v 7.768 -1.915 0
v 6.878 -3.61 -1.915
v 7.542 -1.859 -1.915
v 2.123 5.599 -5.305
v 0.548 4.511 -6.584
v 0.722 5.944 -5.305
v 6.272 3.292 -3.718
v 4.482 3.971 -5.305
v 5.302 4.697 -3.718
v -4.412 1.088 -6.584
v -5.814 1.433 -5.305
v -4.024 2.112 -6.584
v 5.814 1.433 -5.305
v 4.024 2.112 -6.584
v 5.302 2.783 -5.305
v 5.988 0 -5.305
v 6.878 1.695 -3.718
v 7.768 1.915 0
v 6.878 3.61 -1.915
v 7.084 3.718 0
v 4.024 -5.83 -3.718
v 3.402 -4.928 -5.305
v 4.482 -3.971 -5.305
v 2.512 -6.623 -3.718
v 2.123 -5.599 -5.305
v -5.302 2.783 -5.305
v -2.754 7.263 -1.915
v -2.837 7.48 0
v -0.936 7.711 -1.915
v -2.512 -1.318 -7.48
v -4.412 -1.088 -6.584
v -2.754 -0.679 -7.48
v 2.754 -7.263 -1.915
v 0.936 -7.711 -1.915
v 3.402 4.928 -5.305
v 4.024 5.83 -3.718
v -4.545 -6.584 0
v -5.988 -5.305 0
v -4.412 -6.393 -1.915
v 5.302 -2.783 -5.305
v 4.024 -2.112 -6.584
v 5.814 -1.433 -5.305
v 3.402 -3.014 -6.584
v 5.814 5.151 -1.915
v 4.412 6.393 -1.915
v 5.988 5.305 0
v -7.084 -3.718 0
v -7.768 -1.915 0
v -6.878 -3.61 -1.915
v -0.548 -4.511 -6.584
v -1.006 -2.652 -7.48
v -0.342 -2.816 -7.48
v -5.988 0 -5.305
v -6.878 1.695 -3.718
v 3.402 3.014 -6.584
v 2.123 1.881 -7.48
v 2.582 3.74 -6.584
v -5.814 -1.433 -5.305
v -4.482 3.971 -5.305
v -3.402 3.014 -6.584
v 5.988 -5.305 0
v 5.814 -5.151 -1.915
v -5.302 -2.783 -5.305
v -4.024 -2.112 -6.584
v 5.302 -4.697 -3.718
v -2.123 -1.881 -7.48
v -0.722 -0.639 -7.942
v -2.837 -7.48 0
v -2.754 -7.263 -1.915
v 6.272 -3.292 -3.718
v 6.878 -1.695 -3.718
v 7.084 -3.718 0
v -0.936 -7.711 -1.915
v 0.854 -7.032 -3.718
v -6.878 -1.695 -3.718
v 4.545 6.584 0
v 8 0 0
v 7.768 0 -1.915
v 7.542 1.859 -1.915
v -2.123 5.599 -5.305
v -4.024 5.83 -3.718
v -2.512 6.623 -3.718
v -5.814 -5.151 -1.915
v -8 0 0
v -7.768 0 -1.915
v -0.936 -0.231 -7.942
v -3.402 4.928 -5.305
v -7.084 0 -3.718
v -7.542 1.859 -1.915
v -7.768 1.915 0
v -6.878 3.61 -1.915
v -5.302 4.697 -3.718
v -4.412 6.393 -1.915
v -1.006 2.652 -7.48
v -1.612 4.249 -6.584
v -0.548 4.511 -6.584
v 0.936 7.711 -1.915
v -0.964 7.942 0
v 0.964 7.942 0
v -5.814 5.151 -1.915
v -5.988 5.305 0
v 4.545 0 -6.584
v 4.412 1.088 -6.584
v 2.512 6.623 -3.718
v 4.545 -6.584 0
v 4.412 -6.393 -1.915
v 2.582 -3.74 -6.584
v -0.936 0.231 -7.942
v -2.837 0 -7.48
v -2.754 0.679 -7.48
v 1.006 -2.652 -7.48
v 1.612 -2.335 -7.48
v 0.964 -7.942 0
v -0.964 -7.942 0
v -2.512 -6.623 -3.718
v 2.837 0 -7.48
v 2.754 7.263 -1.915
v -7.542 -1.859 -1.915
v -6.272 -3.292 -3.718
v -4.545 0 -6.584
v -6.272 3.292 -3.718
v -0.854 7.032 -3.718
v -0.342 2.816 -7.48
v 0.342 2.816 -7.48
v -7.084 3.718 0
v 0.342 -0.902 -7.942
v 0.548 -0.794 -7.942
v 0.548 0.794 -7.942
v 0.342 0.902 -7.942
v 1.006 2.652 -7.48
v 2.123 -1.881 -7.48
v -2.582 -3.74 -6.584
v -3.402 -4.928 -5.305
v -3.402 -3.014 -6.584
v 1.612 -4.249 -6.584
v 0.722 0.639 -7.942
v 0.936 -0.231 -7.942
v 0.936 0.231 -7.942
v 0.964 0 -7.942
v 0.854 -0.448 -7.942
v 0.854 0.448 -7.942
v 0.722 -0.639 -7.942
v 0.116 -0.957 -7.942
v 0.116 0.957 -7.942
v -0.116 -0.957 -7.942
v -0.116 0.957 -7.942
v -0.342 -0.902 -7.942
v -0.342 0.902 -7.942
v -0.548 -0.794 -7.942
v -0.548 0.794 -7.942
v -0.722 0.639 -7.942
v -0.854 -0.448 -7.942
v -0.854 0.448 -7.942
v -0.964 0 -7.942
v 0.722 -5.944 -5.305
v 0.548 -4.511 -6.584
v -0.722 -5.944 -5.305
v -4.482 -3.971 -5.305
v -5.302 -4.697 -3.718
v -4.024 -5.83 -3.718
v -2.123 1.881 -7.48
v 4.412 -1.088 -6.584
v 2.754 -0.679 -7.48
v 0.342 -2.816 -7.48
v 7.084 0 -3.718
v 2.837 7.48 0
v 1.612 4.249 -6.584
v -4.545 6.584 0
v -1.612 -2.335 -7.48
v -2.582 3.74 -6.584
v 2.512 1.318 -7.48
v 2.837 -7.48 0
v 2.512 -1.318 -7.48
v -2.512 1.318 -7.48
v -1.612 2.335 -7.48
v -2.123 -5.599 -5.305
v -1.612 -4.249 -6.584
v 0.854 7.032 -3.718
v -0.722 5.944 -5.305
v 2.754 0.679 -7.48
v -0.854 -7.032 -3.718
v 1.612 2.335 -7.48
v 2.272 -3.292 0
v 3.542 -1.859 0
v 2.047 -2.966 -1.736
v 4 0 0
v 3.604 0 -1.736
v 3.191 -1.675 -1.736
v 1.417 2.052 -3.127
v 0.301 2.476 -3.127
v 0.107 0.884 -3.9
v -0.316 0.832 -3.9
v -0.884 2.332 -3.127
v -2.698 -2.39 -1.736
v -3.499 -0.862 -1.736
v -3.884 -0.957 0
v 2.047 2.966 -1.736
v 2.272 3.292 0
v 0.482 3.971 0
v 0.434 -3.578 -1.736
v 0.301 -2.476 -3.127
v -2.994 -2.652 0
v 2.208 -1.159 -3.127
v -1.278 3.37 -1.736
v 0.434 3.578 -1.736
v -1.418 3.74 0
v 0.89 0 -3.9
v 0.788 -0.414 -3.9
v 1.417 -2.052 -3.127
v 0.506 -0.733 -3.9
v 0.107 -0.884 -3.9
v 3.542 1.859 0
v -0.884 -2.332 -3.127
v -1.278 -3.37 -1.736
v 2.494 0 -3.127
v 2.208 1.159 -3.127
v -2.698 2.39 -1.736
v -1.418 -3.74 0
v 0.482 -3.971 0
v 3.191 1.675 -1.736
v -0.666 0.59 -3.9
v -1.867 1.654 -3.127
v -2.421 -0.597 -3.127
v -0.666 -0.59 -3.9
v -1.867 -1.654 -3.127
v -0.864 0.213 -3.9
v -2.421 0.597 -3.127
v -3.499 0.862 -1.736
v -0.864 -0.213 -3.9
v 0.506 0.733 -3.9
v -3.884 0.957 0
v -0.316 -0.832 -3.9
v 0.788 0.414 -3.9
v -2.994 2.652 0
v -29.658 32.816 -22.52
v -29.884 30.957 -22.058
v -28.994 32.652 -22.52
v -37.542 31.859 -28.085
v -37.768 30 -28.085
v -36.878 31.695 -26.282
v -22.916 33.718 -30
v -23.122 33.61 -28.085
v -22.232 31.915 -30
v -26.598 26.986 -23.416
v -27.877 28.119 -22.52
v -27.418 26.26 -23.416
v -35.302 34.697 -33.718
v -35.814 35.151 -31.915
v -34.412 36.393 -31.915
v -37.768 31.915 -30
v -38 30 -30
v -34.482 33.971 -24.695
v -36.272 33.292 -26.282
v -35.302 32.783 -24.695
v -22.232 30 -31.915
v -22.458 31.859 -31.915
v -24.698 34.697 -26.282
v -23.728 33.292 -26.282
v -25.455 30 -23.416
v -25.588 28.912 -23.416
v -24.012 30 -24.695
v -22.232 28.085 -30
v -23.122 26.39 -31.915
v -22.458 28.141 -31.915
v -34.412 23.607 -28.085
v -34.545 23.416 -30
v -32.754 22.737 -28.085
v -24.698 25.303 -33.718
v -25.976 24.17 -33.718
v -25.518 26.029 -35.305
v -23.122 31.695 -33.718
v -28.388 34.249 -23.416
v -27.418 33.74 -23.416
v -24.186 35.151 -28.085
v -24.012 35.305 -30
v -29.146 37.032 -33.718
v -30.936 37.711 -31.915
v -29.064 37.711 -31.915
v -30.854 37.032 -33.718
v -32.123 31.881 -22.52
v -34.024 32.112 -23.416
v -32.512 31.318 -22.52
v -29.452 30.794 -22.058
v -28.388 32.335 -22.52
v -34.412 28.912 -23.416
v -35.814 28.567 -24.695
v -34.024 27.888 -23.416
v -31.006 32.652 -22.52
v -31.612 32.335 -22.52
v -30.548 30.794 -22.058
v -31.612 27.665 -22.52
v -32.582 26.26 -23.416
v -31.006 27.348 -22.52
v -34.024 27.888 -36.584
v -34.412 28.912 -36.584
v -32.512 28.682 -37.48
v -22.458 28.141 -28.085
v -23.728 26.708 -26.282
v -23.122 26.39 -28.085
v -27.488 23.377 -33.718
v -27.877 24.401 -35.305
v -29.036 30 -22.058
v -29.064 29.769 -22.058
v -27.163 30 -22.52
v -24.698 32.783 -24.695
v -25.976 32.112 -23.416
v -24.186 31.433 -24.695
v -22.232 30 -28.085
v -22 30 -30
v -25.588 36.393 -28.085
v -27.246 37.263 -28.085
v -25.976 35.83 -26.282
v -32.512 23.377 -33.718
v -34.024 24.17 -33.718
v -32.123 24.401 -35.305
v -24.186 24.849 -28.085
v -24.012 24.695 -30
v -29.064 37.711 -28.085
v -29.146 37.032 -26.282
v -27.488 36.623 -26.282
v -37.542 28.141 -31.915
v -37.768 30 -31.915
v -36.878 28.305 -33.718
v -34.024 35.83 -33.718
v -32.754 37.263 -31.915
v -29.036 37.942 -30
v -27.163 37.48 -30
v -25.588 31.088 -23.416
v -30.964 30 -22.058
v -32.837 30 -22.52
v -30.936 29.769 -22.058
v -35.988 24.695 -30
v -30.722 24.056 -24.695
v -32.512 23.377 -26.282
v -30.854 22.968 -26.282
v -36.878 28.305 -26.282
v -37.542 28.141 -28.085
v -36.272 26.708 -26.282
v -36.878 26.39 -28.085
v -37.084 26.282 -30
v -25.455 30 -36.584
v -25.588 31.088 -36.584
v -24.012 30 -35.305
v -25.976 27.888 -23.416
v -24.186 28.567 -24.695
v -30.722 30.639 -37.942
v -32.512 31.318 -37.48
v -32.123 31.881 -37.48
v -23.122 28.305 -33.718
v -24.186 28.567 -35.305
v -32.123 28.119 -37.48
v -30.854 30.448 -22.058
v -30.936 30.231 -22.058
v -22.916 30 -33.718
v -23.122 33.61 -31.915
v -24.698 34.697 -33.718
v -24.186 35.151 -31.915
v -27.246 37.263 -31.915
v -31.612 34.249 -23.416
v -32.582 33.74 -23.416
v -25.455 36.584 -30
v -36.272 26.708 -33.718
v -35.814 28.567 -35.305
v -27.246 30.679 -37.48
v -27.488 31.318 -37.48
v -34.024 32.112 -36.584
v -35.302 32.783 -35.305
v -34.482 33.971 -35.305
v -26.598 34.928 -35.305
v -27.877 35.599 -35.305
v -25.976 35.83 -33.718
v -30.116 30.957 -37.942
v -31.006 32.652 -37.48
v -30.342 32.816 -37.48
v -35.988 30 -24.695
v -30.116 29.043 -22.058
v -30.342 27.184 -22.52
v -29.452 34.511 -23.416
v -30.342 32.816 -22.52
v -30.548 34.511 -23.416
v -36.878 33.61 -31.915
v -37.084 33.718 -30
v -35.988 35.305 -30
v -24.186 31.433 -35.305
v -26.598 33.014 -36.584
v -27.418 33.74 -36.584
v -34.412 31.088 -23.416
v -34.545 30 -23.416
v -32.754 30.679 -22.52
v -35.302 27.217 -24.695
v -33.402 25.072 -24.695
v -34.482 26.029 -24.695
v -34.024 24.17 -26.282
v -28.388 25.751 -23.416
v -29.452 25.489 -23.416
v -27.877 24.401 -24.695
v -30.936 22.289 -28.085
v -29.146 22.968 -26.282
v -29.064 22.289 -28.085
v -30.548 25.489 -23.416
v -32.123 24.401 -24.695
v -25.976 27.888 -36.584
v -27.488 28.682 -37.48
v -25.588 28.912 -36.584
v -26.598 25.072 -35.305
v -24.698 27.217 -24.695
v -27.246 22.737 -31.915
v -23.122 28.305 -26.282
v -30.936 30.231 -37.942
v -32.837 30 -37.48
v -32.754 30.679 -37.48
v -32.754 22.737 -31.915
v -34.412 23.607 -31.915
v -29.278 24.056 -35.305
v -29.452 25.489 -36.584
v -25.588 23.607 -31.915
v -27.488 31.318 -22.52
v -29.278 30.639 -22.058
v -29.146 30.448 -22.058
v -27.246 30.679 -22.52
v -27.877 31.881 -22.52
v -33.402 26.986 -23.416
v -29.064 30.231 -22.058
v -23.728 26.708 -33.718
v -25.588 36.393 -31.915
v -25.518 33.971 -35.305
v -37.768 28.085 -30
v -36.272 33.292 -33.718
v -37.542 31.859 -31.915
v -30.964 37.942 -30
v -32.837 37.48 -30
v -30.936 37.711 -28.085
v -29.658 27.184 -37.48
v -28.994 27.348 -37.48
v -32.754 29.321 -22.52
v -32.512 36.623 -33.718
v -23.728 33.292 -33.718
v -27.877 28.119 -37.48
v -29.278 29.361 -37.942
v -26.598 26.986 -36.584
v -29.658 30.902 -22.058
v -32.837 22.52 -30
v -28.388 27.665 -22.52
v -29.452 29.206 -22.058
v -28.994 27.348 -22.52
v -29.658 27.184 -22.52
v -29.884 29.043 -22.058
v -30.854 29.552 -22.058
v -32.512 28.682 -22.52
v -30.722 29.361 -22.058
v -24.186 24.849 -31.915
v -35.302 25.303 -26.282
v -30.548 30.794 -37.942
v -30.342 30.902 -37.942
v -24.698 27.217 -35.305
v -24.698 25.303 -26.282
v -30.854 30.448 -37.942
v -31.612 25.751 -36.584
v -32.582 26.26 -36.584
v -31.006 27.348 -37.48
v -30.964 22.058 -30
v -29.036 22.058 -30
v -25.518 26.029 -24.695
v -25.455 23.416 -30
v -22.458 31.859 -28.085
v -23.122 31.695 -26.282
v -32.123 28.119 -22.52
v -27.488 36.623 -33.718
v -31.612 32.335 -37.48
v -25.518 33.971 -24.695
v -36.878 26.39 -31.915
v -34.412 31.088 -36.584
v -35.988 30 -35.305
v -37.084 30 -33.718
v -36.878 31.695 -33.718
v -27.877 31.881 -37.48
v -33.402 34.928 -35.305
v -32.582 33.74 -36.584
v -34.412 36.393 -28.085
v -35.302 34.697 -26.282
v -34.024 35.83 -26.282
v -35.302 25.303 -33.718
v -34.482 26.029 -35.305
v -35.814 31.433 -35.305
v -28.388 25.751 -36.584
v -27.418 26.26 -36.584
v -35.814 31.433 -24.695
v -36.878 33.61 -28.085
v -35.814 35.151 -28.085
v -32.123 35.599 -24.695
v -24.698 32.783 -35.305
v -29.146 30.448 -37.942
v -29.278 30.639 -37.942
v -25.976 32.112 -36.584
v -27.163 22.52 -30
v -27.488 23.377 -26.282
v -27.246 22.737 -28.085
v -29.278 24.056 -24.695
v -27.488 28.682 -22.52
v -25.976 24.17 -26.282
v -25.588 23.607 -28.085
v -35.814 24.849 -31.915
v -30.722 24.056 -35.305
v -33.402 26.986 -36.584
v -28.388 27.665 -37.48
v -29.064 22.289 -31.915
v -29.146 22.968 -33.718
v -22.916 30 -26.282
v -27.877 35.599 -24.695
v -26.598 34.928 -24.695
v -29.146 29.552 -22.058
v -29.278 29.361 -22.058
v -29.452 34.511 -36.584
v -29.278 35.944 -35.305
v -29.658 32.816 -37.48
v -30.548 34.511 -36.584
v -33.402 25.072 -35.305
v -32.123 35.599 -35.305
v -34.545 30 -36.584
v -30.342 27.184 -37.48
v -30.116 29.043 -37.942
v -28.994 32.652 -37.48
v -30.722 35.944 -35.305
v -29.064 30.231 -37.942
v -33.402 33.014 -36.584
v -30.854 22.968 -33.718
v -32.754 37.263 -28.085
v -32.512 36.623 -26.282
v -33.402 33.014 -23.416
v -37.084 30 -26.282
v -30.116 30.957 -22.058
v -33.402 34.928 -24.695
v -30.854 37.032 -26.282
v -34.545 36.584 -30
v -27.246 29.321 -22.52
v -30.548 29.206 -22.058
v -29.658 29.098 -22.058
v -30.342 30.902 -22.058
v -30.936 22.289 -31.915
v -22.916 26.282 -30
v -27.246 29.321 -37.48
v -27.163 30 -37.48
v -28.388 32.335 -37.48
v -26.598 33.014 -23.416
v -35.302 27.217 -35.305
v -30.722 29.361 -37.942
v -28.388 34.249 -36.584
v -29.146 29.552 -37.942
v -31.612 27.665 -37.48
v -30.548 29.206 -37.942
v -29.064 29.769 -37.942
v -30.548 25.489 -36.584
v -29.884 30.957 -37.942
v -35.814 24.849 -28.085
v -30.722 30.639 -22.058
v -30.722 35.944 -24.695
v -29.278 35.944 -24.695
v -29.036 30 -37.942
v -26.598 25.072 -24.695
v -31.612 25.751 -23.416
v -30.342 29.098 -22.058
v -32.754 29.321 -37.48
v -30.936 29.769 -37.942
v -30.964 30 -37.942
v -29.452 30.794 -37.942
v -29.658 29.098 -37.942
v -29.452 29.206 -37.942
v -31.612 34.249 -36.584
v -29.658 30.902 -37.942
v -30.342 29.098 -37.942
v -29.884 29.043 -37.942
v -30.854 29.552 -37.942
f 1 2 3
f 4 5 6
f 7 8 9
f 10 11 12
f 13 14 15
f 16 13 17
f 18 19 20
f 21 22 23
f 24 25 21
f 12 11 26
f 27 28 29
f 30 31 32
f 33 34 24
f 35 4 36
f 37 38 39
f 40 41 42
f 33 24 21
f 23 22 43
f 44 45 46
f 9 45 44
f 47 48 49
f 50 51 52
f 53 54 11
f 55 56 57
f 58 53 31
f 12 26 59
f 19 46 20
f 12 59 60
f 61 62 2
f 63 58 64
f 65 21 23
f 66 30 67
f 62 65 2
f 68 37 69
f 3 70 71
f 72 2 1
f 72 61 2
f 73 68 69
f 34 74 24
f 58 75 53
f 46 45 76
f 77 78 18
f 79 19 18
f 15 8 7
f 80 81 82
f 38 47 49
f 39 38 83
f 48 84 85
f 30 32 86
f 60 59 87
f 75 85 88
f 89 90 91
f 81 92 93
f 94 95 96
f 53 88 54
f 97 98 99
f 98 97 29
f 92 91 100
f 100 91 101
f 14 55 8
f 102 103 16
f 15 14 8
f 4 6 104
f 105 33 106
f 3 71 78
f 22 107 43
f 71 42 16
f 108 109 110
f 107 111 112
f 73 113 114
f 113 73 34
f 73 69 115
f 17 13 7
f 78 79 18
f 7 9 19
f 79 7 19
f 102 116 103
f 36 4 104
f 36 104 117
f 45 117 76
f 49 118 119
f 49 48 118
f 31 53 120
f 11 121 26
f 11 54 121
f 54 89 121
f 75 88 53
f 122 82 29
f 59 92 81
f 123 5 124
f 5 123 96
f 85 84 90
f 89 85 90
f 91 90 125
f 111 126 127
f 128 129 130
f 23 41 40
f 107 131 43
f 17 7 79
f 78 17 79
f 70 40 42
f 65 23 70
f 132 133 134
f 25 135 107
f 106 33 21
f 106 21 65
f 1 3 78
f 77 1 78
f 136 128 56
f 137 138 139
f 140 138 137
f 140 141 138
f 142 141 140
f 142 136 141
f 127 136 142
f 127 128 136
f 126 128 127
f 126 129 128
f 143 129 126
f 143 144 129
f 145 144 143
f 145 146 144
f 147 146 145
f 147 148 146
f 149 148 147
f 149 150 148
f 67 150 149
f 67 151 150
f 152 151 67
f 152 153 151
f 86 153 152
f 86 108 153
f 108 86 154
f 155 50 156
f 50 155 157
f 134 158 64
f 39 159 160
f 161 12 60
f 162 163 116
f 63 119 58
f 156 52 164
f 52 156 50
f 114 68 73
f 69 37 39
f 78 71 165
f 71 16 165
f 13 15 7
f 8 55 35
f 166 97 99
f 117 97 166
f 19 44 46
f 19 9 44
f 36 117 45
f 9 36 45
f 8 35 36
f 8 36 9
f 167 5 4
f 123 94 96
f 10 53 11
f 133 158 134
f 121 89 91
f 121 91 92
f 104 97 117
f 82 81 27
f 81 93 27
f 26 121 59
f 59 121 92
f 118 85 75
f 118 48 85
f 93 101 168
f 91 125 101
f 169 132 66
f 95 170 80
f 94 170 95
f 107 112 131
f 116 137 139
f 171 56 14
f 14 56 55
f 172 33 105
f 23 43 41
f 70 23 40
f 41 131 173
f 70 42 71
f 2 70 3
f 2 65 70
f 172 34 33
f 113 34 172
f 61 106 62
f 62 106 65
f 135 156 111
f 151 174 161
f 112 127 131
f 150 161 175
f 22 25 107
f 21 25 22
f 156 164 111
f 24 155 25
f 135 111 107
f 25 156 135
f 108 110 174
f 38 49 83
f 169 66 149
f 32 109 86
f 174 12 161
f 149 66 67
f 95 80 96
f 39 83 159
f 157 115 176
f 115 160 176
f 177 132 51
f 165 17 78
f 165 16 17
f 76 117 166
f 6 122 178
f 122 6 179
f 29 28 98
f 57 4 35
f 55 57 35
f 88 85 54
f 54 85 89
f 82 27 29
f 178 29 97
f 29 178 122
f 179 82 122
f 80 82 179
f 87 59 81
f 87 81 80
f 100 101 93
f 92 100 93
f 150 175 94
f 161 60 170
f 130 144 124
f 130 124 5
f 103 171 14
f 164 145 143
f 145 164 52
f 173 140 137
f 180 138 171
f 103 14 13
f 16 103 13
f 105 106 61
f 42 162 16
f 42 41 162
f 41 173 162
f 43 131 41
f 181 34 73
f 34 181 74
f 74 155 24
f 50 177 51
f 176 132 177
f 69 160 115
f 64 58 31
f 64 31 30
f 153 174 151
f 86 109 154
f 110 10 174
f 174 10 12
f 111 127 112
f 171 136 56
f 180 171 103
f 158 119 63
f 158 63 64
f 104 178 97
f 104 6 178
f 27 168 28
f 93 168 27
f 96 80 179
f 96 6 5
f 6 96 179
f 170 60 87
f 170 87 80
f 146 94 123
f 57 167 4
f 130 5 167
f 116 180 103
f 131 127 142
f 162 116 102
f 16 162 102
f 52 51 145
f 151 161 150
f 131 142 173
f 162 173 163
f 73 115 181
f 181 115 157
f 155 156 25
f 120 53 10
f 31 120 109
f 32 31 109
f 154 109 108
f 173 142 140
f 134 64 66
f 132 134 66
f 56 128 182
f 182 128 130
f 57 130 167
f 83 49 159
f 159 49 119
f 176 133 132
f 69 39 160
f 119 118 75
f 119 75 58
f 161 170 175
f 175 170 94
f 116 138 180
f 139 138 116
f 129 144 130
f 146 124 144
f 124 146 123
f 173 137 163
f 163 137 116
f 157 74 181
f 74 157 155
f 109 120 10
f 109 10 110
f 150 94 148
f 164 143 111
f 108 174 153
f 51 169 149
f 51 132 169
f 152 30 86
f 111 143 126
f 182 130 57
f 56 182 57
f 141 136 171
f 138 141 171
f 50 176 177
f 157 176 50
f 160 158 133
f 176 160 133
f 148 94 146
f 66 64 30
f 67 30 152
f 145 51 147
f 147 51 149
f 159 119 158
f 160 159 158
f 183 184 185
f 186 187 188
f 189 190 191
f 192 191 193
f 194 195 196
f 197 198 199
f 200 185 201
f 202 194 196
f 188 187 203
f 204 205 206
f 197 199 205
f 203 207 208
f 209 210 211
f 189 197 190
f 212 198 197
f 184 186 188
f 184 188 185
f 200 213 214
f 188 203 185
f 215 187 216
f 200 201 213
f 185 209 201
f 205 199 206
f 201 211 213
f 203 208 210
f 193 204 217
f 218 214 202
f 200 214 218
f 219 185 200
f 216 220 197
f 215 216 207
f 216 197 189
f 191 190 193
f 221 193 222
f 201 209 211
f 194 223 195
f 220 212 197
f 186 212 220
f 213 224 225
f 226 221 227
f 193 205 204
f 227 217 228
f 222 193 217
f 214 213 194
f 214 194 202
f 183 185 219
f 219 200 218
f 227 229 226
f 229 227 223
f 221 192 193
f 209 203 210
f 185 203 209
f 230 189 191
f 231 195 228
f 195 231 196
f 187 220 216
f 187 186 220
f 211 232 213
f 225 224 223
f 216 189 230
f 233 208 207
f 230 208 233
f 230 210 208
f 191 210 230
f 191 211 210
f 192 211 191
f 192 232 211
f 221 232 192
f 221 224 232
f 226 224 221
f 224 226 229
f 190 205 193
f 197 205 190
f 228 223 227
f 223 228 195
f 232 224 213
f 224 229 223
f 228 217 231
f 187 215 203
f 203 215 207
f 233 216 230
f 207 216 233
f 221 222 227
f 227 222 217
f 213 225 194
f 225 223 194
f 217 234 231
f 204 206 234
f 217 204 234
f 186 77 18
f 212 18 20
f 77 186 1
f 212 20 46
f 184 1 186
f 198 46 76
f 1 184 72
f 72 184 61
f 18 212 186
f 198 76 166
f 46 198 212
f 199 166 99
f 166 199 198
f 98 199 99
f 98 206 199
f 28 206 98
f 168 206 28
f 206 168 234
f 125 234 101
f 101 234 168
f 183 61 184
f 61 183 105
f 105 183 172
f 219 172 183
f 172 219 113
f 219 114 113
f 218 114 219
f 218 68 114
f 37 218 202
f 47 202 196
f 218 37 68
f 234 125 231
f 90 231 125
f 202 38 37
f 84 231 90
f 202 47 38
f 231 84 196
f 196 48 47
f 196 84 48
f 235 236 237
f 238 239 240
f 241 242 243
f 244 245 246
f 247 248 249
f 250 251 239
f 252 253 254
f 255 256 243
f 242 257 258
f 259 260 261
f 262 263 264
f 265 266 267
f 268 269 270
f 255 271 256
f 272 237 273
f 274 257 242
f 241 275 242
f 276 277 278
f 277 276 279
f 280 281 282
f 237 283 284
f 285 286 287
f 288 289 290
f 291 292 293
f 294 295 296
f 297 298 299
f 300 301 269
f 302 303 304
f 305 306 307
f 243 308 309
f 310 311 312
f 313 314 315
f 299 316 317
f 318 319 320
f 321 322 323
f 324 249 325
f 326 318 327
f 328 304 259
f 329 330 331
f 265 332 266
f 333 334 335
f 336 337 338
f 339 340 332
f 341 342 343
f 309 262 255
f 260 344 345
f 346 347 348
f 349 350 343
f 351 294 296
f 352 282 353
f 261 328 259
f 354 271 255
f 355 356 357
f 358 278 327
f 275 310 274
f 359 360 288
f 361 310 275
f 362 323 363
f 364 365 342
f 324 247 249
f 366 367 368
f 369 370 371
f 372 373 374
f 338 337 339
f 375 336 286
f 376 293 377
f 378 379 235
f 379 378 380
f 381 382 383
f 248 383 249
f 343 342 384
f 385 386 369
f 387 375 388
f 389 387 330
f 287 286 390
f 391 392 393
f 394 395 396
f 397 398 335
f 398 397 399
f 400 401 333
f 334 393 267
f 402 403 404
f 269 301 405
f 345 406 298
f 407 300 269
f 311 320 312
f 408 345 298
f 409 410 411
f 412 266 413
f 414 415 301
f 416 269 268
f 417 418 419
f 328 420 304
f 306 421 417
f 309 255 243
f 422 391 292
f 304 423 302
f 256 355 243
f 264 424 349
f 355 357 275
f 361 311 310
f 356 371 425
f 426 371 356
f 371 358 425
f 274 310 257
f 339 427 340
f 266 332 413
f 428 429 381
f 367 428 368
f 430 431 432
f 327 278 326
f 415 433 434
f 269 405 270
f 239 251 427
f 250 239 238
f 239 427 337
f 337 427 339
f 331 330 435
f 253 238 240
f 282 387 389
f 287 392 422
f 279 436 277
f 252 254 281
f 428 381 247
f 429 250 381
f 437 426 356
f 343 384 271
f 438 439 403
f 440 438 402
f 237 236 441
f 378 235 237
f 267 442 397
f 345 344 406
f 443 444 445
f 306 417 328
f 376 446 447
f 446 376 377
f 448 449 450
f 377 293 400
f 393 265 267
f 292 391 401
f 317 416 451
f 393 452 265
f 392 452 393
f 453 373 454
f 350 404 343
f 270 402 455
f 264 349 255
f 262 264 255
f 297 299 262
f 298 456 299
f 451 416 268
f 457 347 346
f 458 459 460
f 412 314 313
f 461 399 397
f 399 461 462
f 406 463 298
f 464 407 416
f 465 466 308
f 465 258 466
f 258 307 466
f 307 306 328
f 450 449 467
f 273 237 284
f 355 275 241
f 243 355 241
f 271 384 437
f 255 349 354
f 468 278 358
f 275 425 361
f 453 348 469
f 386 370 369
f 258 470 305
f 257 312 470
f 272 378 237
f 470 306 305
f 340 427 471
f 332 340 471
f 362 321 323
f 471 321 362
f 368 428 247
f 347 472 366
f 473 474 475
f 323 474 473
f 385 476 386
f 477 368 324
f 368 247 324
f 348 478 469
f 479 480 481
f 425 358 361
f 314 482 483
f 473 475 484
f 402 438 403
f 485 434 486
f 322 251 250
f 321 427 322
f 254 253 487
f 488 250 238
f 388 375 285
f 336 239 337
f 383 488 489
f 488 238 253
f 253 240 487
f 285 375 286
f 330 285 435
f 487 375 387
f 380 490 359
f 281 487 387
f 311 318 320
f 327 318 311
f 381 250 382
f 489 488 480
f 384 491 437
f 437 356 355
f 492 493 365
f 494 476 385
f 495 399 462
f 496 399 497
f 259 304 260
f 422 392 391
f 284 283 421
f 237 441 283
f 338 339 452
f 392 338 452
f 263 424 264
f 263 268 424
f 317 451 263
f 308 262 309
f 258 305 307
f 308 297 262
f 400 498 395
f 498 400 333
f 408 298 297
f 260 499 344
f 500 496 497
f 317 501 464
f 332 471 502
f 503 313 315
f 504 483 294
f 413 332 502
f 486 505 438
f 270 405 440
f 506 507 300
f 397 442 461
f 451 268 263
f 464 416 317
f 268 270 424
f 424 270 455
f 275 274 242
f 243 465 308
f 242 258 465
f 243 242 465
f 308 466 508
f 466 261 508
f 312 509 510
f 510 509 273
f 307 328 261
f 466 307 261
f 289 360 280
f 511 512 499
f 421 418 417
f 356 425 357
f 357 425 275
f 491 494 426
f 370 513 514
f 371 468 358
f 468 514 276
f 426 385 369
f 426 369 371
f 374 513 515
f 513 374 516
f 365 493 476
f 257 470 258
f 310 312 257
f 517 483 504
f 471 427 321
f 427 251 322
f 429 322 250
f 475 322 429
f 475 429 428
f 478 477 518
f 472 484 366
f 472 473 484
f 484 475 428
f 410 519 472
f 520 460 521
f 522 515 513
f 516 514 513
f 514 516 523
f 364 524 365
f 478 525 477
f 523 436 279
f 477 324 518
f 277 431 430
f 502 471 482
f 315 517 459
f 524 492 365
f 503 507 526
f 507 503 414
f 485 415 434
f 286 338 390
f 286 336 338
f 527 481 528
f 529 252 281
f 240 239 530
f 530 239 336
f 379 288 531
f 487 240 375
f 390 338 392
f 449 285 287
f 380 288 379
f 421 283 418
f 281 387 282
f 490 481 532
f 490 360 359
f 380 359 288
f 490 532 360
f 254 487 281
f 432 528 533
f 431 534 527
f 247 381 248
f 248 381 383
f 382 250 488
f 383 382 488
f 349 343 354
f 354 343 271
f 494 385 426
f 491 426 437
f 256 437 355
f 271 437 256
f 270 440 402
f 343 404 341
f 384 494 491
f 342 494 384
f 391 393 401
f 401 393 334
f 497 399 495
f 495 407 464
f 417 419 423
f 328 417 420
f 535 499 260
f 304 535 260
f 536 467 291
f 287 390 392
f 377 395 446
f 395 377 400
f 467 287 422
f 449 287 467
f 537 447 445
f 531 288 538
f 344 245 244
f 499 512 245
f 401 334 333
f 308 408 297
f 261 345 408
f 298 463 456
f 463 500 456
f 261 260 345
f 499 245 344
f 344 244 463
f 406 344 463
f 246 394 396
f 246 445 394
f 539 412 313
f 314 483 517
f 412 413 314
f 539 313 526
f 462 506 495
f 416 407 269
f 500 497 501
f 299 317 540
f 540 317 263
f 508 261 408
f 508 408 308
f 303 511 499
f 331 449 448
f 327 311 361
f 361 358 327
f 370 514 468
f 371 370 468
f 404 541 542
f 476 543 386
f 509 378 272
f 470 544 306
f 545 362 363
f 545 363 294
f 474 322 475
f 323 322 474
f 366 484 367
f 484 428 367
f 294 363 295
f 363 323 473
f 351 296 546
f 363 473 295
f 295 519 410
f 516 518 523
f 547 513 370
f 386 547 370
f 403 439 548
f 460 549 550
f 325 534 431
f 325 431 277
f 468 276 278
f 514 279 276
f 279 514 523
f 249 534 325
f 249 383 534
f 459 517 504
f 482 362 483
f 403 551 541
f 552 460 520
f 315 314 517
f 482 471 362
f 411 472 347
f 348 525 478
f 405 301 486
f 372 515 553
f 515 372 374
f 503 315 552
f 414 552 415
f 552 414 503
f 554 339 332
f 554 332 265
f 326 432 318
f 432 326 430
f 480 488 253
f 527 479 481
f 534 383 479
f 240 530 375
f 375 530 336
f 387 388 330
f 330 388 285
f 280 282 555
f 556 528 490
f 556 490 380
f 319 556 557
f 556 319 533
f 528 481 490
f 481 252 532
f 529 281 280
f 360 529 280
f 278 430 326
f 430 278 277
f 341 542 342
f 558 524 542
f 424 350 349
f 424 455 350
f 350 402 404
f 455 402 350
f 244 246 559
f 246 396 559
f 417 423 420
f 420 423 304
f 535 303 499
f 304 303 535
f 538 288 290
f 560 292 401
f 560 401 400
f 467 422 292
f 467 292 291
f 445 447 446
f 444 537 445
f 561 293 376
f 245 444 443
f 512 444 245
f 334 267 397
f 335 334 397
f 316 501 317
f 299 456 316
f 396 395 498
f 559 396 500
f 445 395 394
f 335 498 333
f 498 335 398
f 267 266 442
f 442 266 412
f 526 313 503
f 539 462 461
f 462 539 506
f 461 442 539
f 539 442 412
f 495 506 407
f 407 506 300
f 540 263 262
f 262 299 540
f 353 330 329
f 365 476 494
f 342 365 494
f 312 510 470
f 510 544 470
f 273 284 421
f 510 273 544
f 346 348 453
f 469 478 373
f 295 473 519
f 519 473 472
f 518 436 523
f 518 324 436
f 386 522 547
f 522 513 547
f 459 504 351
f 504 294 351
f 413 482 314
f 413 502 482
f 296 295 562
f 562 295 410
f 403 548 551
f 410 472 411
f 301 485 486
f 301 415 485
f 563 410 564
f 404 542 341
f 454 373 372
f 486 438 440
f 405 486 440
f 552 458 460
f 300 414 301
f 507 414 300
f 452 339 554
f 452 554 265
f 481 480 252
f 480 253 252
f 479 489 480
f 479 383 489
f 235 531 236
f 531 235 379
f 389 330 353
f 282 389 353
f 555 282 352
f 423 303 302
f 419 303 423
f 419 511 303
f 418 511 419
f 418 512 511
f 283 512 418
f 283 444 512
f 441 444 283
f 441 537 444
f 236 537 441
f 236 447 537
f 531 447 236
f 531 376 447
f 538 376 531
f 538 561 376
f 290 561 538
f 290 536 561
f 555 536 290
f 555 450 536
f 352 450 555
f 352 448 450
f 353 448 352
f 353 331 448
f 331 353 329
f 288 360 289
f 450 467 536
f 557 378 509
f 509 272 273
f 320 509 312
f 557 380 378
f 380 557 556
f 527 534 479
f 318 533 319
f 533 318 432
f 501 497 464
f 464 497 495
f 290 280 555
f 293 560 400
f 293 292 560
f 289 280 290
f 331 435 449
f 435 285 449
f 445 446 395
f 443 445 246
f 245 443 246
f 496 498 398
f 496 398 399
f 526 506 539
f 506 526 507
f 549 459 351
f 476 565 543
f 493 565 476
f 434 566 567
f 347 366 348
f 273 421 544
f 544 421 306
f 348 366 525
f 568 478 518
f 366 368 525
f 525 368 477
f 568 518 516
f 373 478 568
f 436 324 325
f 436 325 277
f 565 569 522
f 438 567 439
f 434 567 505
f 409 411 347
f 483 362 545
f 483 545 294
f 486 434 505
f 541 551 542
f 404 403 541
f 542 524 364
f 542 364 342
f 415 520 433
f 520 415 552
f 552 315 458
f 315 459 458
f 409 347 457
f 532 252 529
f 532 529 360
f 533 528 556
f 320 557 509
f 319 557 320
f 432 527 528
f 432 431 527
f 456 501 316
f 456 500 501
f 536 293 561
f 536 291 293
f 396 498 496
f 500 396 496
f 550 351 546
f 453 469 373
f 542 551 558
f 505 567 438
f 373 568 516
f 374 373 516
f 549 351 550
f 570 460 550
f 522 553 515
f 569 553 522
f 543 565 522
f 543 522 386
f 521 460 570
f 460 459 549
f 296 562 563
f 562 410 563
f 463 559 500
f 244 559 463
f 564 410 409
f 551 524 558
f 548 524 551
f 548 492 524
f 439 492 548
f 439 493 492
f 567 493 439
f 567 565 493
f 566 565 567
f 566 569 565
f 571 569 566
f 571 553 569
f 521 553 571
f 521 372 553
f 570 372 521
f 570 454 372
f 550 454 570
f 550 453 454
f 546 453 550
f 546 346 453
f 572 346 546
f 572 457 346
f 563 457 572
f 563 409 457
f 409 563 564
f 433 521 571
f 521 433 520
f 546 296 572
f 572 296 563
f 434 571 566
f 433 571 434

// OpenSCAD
// Generated by generate_scads.py
union() {
  translate([-30,30,-30]) {
    sphere(r=8);
  }
  difference() {
    sphere(r=8);
    sphere(r=4);
    cube(size=[25,15,25], center=false);
    cylinder(h=30, r=12, center=false);
  }
}
